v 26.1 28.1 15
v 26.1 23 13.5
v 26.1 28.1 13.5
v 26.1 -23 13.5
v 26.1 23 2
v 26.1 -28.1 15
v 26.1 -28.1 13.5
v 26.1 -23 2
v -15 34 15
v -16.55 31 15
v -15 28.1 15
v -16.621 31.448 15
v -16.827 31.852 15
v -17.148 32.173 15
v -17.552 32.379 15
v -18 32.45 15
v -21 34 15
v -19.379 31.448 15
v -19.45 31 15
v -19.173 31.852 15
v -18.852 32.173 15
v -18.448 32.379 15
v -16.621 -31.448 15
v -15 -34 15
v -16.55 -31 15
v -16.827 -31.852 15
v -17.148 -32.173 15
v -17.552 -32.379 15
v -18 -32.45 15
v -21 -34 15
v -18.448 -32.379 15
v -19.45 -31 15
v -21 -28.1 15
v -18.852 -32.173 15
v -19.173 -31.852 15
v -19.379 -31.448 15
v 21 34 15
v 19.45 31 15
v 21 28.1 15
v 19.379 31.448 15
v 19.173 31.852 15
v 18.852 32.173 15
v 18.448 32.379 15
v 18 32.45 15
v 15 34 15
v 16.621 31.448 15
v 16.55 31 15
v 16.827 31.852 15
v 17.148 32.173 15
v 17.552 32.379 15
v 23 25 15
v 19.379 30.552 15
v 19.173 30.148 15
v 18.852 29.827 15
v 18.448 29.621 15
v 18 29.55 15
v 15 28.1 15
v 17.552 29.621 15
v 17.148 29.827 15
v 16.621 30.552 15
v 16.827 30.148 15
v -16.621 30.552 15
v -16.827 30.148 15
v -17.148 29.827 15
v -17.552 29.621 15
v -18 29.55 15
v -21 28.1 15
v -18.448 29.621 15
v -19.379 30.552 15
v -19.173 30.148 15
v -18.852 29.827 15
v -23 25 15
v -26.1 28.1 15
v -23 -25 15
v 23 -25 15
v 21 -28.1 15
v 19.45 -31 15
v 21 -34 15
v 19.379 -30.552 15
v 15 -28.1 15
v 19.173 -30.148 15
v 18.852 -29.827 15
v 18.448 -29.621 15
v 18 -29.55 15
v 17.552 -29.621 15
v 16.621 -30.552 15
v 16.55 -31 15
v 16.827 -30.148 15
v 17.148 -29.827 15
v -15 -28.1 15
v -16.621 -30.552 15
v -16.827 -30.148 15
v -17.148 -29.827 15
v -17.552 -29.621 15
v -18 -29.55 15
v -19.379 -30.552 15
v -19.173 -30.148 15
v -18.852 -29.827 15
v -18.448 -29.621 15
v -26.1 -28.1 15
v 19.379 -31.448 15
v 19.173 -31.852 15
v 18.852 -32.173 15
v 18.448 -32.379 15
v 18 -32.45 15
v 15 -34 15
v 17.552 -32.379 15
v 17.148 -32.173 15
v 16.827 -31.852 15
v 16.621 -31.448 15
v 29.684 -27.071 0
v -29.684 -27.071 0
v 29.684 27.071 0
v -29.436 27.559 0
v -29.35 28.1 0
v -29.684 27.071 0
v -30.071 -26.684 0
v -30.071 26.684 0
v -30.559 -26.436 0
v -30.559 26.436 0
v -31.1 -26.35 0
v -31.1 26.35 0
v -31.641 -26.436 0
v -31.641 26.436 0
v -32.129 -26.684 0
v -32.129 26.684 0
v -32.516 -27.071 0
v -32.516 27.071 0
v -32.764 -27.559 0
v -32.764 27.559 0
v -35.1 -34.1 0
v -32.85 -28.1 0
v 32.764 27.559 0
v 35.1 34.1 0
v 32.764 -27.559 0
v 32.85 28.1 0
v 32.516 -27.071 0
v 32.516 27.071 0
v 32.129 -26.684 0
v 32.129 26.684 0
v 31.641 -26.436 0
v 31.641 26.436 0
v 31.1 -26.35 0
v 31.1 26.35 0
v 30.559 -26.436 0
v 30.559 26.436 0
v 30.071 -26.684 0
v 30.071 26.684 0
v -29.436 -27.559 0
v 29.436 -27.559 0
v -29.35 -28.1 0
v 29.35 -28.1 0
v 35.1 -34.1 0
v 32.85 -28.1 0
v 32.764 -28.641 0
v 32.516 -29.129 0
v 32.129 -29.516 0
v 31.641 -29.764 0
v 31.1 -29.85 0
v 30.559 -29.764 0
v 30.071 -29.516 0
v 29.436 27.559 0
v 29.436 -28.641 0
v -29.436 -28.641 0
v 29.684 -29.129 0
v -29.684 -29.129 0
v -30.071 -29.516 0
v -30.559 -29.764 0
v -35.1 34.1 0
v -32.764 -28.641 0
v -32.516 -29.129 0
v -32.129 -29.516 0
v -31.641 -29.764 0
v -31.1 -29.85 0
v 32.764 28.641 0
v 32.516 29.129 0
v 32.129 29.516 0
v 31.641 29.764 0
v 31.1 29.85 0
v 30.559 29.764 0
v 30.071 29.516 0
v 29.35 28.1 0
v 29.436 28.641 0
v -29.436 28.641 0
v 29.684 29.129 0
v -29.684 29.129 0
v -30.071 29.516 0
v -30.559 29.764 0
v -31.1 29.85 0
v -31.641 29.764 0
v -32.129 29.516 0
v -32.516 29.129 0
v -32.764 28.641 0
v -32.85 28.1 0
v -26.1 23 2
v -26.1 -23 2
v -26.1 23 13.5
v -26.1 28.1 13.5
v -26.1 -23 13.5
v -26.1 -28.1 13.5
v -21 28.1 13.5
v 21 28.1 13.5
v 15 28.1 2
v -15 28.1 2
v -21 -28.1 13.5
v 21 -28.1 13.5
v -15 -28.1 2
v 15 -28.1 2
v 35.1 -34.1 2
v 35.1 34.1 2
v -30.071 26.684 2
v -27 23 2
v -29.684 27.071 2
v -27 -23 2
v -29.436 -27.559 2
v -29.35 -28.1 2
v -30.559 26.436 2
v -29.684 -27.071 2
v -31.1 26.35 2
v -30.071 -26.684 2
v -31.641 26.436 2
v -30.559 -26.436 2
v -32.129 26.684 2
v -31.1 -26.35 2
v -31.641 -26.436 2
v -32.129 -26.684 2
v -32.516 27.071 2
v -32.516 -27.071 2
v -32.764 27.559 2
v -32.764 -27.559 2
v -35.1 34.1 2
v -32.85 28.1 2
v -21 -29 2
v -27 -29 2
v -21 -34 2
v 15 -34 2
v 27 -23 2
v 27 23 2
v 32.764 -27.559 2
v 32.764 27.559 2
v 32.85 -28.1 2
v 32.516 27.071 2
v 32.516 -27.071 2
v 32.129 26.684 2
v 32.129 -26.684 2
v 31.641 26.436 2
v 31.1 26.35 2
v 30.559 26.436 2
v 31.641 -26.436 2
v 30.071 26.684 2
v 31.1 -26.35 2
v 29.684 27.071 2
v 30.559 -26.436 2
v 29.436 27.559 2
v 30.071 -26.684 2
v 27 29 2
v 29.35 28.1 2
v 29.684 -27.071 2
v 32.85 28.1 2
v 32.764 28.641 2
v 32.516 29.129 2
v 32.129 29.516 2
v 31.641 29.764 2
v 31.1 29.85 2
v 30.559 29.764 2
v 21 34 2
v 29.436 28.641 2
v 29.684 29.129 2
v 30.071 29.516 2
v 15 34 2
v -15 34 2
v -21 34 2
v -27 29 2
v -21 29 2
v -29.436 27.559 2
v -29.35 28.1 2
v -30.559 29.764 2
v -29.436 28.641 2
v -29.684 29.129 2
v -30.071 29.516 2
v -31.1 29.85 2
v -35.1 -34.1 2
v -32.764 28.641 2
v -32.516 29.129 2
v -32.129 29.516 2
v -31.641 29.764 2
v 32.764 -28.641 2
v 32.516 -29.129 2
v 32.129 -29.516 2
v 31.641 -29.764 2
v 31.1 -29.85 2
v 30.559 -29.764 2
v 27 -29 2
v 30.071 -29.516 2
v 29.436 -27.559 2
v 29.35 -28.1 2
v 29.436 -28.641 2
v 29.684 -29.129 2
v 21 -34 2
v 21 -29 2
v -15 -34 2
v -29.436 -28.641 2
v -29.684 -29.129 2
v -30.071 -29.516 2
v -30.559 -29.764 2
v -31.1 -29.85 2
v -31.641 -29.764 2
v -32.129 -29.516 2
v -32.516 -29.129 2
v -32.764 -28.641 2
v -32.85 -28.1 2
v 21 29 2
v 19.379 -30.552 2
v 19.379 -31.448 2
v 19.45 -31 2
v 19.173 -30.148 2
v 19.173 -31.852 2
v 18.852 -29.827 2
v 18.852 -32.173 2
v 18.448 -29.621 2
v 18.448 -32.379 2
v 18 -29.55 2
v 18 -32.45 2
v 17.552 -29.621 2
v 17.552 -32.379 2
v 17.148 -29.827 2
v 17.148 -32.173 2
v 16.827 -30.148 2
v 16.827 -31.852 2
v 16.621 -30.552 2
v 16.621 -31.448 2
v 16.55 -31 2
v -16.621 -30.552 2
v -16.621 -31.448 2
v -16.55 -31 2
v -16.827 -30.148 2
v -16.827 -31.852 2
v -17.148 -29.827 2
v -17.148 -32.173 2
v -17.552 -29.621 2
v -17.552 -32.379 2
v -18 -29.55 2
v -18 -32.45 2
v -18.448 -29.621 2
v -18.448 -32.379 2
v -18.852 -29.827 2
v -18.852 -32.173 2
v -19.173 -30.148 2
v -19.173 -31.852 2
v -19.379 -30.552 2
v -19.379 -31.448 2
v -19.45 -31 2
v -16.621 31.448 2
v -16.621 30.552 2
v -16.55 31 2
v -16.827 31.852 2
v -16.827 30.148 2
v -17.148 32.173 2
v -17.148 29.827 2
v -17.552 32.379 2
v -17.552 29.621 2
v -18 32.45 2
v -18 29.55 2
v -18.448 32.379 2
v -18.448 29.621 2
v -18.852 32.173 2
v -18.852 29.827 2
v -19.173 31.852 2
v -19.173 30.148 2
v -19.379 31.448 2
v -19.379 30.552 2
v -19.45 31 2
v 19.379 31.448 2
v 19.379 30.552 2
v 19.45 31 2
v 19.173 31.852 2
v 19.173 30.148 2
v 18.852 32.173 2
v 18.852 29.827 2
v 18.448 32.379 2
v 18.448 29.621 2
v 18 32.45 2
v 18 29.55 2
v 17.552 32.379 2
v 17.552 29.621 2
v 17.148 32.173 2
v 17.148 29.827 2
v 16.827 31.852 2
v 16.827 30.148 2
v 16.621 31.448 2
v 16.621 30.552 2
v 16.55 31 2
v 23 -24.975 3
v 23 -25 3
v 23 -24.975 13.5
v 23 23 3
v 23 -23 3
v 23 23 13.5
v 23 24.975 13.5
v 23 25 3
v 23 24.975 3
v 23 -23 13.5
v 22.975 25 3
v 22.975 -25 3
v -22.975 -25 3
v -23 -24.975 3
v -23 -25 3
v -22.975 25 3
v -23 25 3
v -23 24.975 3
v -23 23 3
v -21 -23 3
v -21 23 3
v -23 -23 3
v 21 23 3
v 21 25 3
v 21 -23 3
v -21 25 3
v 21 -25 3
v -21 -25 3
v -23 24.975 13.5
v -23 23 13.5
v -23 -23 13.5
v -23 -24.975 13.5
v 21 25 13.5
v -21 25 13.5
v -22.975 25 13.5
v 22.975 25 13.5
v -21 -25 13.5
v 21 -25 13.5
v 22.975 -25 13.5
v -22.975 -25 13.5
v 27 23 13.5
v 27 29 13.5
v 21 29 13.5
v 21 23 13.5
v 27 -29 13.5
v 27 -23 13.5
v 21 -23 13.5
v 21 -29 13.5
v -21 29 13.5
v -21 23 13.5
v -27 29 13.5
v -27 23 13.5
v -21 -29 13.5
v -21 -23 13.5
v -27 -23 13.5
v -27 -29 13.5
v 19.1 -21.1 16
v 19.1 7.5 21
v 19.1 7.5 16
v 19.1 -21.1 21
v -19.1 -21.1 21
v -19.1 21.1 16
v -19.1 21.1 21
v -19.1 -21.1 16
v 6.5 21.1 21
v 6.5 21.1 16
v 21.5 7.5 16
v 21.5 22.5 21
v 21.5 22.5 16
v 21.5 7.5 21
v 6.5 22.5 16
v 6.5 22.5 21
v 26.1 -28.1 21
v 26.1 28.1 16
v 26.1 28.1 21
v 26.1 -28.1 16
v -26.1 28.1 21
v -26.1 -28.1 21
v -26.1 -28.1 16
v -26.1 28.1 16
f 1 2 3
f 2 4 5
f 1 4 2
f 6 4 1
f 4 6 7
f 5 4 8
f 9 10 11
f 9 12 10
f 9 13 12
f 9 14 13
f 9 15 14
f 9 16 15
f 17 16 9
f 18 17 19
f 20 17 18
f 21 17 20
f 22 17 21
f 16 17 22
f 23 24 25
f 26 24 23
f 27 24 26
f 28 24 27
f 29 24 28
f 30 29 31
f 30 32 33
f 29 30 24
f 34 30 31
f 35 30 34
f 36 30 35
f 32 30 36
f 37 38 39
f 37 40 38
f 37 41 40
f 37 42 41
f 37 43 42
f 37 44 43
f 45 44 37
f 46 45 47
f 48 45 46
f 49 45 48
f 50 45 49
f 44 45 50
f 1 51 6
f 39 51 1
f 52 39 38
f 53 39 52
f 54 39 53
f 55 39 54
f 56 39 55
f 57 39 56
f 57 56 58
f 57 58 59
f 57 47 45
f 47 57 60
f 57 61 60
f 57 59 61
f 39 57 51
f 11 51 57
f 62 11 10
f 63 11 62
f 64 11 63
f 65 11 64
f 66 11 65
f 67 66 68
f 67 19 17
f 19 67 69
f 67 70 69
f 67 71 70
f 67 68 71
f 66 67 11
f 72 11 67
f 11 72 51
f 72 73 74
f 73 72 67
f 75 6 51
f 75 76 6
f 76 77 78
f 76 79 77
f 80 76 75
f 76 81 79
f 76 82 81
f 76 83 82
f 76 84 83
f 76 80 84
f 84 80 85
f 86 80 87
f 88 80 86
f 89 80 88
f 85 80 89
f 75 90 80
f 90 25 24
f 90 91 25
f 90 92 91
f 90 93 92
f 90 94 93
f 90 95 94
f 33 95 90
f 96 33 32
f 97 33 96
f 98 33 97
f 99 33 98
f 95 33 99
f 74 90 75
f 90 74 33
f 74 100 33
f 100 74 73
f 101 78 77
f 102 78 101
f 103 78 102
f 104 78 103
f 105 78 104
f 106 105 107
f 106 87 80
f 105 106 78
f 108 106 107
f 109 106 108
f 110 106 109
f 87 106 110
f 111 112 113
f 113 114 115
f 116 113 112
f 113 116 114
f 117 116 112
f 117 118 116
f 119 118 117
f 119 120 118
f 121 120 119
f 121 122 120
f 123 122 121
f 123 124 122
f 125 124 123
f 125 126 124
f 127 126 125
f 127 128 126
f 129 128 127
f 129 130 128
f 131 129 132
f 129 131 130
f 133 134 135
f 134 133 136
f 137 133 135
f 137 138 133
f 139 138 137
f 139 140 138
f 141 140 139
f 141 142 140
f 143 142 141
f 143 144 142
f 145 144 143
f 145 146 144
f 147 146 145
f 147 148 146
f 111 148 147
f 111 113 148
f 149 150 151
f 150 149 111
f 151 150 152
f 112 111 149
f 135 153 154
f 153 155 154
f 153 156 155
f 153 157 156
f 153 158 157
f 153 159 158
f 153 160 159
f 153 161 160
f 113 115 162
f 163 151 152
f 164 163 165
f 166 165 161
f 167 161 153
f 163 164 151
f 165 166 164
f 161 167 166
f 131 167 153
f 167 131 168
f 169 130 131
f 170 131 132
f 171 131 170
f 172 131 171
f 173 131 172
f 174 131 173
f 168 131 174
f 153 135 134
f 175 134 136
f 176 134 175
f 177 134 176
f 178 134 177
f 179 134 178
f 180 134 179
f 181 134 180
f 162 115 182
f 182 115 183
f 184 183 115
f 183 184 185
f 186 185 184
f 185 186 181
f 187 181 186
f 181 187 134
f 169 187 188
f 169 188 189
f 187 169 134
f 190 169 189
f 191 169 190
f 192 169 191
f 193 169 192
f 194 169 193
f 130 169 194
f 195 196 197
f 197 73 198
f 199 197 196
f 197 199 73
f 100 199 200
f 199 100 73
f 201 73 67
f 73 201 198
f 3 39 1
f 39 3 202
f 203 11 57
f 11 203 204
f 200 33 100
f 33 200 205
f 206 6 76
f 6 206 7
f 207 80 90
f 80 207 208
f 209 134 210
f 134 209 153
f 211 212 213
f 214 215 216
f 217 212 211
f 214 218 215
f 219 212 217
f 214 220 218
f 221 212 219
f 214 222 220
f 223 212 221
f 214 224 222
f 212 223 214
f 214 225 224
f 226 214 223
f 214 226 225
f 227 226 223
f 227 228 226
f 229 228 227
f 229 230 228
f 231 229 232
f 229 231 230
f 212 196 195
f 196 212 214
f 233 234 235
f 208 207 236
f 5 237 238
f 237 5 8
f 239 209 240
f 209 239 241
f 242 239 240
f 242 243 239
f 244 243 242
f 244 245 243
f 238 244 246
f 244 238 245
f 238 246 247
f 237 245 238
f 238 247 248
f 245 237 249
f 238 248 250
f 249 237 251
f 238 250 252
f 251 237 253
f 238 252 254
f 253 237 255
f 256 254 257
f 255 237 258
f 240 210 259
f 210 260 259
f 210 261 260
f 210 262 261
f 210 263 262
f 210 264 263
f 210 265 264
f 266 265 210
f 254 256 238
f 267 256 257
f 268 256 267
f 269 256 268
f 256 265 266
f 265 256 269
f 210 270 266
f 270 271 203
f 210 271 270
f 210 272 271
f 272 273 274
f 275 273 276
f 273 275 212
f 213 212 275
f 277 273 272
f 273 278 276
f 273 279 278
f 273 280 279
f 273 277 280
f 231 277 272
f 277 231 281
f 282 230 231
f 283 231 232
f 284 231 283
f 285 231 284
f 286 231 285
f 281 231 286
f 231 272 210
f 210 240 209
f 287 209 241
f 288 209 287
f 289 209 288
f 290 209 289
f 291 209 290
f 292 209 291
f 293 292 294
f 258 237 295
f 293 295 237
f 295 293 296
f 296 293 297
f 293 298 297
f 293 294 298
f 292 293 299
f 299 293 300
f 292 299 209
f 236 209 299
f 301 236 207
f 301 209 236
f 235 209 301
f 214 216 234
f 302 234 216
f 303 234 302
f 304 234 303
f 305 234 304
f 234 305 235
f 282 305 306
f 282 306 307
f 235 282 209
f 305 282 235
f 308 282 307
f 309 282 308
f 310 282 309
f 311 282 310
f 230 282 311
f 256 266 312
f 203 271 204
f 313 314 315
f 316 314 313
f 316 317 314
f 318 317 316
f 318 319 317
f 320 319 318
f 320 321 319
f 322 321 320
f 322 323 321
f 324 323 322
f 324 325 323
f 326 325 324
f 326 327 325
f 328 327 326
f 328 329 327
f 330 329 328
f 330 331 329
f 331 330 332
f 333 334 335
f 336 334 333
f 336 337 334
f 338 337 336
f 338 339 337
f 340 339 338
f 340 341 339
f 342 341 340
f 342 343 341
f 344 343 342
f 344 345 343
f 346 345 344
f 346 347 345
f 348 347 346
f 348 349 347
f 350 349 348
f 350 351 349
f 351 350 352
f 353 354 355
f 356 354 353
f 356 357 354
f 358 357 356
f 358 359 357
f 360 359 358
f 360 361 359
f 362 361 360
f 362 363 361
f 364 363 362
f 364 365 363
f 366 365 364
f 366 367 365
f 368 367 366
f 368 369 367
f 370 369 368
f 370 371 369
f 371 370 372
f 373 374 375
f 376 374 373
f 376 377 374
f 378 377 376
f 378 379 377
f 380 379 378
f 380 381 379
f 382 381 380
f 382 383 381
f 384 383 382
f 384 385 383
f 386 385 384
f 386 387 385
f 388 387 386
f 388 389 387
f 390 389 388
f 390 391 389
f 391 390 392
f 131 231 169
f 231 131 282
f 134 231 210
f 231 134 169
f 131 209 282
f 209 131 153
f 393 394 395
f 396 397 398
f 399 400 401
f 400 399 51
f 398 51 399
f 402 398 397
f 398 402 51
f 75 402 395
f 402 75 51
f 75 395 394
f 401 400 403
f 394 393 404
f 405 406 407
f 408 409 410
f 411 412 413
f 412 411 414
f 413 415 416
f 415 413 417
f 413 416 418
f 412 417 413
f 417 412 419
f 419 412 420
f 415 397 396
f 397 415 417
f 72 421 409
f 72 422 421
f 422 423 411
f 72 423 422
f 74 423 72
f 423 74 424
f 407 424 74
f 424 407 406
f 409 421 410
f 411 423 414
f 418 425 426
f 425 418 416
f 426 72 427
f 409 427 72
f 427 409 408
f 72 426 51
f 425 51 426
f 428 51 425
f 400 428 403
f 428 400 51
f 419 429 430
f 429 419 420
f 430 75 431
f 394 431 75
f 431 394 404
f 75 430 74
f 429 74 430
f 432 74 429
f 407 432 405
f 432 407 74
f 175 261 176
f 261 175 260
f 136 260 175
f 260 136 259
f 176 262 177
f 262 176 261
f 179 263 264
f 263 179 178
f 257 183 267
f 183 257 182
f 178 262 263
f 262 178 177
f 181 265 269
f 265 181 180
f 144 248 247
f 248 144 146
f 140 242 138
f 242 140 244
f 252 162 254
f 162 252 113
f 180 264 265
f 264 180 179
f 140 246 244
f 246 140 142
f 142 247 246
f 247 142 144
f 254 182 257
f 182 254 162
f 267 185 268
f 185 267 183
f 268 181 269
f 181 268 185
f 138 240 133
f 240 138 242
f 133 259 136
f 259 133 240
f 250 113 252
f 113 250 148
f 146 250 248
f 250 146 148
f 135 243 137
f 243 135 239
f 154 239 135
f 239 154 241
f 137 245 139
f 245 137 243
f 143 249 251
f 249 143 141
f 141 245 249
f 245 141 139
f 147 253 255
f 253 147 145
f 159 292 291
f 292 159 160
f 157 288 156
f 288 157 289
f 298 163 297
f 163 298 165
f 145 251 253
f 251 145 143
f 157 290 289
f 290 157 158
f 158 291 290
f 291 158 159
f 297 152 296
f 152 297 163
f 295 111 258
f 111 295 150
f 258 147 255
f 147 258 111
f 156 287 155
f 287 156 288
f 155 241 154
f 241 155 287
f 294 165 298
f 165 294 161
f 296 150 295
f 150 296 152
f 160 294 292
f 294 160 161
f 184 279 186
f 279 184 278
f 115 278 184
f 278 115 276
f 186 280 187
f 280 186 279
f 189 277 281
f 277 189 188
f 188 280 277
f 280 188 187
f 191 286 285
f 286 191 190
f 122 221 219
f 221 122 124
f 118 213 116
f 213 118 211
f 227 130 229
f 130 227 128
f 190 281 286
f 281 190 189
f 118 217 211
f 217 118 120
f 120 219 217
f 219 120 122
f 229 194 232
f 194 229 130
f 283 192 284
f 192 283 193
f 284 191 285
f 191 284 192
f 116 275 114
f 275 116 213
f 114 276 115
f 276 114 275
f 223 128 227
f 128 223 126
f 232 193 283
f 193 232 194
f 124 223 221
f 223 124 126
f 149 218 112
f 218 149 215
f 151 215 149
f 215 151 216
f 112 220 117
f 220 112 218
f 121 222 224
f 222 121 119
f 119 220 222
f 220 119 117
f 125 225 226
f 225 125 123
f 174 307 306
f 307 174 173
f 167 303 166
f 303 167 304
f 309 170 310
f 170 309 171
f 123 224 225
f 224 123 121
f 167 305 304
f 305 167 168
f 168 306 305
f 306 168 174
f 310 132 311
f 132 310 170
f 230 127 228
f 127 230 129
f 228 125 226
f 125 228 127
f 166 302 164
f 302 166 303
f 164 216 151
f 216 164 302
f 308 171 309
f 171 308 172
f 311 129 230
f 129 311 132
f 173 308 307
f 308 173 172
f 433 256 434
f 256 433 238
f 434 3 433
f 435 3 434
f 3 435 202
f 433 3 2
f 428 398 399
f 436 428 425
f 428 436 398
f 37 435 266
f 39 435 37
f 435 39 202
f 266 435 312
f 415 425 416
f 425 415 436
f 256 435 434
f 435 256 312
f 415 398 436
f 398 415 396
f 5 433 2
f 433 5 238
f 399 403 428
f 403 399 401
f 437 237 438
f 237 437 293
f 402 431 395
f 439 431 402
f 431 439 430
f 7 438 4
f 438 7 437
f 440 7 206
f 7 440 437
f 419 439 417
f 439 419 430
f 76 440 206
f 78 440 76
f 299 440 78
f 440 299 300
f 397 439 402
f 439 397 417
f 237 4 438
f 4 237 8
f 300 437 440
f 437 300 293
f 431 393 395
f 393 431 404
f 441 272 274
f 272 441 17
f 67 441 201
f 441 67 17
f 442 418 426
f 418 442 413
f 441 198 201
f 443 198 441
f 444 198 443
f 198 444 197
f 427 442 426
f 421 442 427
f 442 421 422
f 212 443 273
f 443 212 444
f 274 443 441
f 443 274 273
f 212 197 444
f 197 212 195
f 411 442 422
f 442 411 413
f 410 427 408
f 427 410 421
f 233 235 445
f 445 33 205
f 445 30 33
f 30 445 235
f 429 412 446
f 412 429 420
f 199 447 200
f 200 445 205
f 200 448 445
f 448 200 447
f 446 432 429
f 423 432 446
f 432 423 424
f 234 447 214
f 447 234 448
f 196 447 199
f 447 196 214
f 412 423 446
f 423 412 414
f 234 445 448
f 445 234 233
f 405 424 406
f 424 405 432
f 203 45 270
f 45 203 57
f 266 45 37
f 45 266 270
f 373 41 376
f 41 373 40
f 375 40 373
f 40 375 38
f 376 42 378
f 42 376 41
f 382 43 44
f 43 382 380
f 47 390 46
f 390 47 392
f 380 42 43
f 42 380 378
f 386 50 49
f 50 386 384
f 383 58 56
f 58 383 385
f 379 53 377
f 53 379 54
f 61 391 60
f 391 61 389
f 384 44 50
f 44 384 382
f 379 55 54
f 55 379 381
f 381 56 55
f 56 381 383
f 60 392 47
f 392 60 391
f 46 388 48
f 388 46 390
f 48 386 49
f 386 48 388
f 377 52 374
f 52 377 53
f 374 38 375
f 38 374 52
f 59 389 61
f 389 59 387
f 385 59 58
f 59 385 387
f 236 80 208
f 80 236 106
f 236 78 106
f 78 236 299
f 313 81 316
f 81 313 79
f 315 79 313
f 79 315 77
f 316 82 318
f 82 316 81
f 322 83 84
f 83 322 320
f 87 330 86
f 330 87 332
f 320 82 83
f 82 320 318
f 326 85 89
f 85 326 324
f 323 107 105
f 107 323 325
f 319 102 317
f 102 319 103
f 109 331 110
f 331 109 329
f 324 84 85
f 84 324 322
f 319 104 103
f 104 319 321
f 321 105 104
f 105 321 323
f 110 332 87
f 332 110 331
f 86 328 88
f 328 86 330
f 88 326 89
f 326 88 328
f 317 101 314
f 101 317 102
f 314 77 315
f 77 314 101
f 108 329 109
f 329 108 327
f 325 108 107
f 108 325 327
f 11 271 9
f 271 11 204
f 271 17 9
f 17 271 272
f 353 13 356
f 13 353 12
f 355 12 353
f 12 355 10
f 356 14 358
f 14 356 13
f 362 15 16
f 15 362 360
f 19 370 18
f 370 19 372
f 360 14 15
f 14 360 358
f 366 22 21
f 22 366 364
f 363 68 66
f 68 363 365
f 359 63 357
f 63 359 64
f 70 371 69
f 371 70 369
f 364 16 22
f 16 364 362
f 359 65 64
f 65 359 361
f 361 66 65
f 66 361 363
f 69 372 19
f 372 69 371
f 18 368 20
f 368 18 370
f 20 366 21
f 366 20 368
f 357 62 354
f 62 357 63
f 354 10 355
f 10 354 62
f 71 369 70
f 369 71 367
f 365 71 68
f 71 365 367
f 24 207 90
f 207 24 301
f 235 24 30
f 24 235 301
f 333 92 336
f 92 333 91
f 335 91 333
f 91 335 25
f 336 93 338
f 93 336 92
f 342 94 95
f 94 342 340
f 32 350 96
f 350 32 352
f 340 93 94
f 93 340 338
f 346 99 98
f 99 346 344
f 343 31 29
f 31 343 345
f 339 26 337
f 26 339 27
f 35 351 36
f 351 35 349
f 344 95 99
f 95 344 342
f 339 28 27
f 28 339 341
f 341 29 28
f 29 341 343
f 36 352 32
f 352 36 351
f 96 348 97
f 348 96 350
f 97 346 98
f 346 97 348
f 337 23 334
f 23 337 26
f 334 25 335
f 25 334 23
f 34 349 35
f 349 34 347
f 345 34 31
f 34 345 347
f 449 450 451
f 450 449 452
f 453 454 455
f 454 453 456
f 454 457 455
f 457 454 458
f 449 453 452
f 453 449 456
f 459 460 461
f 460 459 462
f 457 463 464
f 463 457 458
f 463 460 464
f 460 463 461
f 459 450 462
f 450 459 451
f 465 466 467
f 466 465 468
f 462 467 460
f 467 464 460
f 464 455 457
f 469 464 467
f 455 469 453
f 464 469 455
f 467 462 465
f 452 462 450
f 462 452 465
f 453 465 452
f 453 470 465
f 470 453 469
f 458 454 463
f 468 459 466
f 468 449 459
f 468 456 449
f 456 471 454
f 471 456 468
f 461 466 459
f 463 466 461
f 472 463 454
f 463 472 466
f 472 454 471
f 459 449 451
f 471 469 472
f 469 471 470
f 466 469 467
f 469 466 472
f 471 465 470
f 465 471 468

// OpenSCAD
/* File: ~/GliderWinchItems/BMS/hw/ELCON-CANbox.scad
  * frame for pc board
  * Latest edit: 20230126
 */
 
 $fn=20;
  
module rounded_rectangle_hull(wid,slen,ht,rad)
{
 hull()
 {    
    translate([-wid/2+rad,rad,0])
        cylinder(r=rad,h=ht,center=false);

   translate([ wid/2-rad,rad,0])
        cylinder(r=rad,h=ht,center=false);

    translate([-wid/2+rad,slen-rad,0])
        cylinder(r=rad,h=ht,center=false);
    
    translate([ wid/2-rad,slen-rad,0])
        cylinder(r=rad,h=ht,center=false);
 }
}
len = 46.2;
wid = 50.2;
ht = 15;
wall = 3;
bot = 3;

psq = 6.0;
pht = ht - 1.5;
phole = 48;//54;

module post(a,xht)
{
    translate(a)
    {
        difference()
        {
            union()
            {
                translate([0,0,xht/2])
                cube([psq,psq,xht],center = true);
            }
            union()
            {
                cylinder(d=2.9,h=100, center=false);
            }
        }
    }
}


module box()
{
    del1 = 2.8;
    difference()
    {
        union()
        {
            translate([0,0,ht/2])
            cube([len+2*wall,wid+2*wall,ht],center = true);
            translate([0,0,2/2])
            cube([len+2*wall+18,wid+2*wall+12,2],center = true);

        }
        union()
        {
            translate([0,0,ht/2+bot])
            cube([len-wall+del1,wid-wall+del1,ht],center = true);
            
            // Mounting holes in base
            xof = len/2+wall+2;
            xofx = len/2+wall+5;
            translate([ xofx, xof,0]) cylinder(d=3.5,h=50,center=true);
            translate([ xofx,-xof,0]) cylinder(d=3.5,h=50,center=true);
            translate([-xofx, xof,0]) cylinder(d=3.5,h=50,center=true);
            translate([-xofx,-xof,0]) cylinder(d=3.5,h=50,center=true);
        }
    }
}
poff = phole/2;
py2 = poff + 2;
box();
post([ poff, py2,0],pht);
post([ poff,-py2,0],pht);
post([-poff, py2,0],pht);
post([-poff,-py2,0],pht);

px3 = 18;
py3 = 31;

post([ px3, py3,0],ht);
post([ px3,-py3,0],ht);
post([-px3, py3,0],ht);
post([-px3,-py3,0],ht);

module clamp()
{
 del2 = -5;
    cht = 5;
 difference()
 {
     union()
     {
        translate([0,0,ht/2])
        cube([len+2*wall,wid+2*wall,cht],center = true);
     }
     union()
     {
        translate([0,0,ht/2+bot])
        cube([len-wall+del2,wid-wall+del2,20],center = true);
         
        translate([14,15,ht/2+bot])
        cube([15,15,20],center = true);
         
     }
 }   
}
translate([0,0,11])clamp();
